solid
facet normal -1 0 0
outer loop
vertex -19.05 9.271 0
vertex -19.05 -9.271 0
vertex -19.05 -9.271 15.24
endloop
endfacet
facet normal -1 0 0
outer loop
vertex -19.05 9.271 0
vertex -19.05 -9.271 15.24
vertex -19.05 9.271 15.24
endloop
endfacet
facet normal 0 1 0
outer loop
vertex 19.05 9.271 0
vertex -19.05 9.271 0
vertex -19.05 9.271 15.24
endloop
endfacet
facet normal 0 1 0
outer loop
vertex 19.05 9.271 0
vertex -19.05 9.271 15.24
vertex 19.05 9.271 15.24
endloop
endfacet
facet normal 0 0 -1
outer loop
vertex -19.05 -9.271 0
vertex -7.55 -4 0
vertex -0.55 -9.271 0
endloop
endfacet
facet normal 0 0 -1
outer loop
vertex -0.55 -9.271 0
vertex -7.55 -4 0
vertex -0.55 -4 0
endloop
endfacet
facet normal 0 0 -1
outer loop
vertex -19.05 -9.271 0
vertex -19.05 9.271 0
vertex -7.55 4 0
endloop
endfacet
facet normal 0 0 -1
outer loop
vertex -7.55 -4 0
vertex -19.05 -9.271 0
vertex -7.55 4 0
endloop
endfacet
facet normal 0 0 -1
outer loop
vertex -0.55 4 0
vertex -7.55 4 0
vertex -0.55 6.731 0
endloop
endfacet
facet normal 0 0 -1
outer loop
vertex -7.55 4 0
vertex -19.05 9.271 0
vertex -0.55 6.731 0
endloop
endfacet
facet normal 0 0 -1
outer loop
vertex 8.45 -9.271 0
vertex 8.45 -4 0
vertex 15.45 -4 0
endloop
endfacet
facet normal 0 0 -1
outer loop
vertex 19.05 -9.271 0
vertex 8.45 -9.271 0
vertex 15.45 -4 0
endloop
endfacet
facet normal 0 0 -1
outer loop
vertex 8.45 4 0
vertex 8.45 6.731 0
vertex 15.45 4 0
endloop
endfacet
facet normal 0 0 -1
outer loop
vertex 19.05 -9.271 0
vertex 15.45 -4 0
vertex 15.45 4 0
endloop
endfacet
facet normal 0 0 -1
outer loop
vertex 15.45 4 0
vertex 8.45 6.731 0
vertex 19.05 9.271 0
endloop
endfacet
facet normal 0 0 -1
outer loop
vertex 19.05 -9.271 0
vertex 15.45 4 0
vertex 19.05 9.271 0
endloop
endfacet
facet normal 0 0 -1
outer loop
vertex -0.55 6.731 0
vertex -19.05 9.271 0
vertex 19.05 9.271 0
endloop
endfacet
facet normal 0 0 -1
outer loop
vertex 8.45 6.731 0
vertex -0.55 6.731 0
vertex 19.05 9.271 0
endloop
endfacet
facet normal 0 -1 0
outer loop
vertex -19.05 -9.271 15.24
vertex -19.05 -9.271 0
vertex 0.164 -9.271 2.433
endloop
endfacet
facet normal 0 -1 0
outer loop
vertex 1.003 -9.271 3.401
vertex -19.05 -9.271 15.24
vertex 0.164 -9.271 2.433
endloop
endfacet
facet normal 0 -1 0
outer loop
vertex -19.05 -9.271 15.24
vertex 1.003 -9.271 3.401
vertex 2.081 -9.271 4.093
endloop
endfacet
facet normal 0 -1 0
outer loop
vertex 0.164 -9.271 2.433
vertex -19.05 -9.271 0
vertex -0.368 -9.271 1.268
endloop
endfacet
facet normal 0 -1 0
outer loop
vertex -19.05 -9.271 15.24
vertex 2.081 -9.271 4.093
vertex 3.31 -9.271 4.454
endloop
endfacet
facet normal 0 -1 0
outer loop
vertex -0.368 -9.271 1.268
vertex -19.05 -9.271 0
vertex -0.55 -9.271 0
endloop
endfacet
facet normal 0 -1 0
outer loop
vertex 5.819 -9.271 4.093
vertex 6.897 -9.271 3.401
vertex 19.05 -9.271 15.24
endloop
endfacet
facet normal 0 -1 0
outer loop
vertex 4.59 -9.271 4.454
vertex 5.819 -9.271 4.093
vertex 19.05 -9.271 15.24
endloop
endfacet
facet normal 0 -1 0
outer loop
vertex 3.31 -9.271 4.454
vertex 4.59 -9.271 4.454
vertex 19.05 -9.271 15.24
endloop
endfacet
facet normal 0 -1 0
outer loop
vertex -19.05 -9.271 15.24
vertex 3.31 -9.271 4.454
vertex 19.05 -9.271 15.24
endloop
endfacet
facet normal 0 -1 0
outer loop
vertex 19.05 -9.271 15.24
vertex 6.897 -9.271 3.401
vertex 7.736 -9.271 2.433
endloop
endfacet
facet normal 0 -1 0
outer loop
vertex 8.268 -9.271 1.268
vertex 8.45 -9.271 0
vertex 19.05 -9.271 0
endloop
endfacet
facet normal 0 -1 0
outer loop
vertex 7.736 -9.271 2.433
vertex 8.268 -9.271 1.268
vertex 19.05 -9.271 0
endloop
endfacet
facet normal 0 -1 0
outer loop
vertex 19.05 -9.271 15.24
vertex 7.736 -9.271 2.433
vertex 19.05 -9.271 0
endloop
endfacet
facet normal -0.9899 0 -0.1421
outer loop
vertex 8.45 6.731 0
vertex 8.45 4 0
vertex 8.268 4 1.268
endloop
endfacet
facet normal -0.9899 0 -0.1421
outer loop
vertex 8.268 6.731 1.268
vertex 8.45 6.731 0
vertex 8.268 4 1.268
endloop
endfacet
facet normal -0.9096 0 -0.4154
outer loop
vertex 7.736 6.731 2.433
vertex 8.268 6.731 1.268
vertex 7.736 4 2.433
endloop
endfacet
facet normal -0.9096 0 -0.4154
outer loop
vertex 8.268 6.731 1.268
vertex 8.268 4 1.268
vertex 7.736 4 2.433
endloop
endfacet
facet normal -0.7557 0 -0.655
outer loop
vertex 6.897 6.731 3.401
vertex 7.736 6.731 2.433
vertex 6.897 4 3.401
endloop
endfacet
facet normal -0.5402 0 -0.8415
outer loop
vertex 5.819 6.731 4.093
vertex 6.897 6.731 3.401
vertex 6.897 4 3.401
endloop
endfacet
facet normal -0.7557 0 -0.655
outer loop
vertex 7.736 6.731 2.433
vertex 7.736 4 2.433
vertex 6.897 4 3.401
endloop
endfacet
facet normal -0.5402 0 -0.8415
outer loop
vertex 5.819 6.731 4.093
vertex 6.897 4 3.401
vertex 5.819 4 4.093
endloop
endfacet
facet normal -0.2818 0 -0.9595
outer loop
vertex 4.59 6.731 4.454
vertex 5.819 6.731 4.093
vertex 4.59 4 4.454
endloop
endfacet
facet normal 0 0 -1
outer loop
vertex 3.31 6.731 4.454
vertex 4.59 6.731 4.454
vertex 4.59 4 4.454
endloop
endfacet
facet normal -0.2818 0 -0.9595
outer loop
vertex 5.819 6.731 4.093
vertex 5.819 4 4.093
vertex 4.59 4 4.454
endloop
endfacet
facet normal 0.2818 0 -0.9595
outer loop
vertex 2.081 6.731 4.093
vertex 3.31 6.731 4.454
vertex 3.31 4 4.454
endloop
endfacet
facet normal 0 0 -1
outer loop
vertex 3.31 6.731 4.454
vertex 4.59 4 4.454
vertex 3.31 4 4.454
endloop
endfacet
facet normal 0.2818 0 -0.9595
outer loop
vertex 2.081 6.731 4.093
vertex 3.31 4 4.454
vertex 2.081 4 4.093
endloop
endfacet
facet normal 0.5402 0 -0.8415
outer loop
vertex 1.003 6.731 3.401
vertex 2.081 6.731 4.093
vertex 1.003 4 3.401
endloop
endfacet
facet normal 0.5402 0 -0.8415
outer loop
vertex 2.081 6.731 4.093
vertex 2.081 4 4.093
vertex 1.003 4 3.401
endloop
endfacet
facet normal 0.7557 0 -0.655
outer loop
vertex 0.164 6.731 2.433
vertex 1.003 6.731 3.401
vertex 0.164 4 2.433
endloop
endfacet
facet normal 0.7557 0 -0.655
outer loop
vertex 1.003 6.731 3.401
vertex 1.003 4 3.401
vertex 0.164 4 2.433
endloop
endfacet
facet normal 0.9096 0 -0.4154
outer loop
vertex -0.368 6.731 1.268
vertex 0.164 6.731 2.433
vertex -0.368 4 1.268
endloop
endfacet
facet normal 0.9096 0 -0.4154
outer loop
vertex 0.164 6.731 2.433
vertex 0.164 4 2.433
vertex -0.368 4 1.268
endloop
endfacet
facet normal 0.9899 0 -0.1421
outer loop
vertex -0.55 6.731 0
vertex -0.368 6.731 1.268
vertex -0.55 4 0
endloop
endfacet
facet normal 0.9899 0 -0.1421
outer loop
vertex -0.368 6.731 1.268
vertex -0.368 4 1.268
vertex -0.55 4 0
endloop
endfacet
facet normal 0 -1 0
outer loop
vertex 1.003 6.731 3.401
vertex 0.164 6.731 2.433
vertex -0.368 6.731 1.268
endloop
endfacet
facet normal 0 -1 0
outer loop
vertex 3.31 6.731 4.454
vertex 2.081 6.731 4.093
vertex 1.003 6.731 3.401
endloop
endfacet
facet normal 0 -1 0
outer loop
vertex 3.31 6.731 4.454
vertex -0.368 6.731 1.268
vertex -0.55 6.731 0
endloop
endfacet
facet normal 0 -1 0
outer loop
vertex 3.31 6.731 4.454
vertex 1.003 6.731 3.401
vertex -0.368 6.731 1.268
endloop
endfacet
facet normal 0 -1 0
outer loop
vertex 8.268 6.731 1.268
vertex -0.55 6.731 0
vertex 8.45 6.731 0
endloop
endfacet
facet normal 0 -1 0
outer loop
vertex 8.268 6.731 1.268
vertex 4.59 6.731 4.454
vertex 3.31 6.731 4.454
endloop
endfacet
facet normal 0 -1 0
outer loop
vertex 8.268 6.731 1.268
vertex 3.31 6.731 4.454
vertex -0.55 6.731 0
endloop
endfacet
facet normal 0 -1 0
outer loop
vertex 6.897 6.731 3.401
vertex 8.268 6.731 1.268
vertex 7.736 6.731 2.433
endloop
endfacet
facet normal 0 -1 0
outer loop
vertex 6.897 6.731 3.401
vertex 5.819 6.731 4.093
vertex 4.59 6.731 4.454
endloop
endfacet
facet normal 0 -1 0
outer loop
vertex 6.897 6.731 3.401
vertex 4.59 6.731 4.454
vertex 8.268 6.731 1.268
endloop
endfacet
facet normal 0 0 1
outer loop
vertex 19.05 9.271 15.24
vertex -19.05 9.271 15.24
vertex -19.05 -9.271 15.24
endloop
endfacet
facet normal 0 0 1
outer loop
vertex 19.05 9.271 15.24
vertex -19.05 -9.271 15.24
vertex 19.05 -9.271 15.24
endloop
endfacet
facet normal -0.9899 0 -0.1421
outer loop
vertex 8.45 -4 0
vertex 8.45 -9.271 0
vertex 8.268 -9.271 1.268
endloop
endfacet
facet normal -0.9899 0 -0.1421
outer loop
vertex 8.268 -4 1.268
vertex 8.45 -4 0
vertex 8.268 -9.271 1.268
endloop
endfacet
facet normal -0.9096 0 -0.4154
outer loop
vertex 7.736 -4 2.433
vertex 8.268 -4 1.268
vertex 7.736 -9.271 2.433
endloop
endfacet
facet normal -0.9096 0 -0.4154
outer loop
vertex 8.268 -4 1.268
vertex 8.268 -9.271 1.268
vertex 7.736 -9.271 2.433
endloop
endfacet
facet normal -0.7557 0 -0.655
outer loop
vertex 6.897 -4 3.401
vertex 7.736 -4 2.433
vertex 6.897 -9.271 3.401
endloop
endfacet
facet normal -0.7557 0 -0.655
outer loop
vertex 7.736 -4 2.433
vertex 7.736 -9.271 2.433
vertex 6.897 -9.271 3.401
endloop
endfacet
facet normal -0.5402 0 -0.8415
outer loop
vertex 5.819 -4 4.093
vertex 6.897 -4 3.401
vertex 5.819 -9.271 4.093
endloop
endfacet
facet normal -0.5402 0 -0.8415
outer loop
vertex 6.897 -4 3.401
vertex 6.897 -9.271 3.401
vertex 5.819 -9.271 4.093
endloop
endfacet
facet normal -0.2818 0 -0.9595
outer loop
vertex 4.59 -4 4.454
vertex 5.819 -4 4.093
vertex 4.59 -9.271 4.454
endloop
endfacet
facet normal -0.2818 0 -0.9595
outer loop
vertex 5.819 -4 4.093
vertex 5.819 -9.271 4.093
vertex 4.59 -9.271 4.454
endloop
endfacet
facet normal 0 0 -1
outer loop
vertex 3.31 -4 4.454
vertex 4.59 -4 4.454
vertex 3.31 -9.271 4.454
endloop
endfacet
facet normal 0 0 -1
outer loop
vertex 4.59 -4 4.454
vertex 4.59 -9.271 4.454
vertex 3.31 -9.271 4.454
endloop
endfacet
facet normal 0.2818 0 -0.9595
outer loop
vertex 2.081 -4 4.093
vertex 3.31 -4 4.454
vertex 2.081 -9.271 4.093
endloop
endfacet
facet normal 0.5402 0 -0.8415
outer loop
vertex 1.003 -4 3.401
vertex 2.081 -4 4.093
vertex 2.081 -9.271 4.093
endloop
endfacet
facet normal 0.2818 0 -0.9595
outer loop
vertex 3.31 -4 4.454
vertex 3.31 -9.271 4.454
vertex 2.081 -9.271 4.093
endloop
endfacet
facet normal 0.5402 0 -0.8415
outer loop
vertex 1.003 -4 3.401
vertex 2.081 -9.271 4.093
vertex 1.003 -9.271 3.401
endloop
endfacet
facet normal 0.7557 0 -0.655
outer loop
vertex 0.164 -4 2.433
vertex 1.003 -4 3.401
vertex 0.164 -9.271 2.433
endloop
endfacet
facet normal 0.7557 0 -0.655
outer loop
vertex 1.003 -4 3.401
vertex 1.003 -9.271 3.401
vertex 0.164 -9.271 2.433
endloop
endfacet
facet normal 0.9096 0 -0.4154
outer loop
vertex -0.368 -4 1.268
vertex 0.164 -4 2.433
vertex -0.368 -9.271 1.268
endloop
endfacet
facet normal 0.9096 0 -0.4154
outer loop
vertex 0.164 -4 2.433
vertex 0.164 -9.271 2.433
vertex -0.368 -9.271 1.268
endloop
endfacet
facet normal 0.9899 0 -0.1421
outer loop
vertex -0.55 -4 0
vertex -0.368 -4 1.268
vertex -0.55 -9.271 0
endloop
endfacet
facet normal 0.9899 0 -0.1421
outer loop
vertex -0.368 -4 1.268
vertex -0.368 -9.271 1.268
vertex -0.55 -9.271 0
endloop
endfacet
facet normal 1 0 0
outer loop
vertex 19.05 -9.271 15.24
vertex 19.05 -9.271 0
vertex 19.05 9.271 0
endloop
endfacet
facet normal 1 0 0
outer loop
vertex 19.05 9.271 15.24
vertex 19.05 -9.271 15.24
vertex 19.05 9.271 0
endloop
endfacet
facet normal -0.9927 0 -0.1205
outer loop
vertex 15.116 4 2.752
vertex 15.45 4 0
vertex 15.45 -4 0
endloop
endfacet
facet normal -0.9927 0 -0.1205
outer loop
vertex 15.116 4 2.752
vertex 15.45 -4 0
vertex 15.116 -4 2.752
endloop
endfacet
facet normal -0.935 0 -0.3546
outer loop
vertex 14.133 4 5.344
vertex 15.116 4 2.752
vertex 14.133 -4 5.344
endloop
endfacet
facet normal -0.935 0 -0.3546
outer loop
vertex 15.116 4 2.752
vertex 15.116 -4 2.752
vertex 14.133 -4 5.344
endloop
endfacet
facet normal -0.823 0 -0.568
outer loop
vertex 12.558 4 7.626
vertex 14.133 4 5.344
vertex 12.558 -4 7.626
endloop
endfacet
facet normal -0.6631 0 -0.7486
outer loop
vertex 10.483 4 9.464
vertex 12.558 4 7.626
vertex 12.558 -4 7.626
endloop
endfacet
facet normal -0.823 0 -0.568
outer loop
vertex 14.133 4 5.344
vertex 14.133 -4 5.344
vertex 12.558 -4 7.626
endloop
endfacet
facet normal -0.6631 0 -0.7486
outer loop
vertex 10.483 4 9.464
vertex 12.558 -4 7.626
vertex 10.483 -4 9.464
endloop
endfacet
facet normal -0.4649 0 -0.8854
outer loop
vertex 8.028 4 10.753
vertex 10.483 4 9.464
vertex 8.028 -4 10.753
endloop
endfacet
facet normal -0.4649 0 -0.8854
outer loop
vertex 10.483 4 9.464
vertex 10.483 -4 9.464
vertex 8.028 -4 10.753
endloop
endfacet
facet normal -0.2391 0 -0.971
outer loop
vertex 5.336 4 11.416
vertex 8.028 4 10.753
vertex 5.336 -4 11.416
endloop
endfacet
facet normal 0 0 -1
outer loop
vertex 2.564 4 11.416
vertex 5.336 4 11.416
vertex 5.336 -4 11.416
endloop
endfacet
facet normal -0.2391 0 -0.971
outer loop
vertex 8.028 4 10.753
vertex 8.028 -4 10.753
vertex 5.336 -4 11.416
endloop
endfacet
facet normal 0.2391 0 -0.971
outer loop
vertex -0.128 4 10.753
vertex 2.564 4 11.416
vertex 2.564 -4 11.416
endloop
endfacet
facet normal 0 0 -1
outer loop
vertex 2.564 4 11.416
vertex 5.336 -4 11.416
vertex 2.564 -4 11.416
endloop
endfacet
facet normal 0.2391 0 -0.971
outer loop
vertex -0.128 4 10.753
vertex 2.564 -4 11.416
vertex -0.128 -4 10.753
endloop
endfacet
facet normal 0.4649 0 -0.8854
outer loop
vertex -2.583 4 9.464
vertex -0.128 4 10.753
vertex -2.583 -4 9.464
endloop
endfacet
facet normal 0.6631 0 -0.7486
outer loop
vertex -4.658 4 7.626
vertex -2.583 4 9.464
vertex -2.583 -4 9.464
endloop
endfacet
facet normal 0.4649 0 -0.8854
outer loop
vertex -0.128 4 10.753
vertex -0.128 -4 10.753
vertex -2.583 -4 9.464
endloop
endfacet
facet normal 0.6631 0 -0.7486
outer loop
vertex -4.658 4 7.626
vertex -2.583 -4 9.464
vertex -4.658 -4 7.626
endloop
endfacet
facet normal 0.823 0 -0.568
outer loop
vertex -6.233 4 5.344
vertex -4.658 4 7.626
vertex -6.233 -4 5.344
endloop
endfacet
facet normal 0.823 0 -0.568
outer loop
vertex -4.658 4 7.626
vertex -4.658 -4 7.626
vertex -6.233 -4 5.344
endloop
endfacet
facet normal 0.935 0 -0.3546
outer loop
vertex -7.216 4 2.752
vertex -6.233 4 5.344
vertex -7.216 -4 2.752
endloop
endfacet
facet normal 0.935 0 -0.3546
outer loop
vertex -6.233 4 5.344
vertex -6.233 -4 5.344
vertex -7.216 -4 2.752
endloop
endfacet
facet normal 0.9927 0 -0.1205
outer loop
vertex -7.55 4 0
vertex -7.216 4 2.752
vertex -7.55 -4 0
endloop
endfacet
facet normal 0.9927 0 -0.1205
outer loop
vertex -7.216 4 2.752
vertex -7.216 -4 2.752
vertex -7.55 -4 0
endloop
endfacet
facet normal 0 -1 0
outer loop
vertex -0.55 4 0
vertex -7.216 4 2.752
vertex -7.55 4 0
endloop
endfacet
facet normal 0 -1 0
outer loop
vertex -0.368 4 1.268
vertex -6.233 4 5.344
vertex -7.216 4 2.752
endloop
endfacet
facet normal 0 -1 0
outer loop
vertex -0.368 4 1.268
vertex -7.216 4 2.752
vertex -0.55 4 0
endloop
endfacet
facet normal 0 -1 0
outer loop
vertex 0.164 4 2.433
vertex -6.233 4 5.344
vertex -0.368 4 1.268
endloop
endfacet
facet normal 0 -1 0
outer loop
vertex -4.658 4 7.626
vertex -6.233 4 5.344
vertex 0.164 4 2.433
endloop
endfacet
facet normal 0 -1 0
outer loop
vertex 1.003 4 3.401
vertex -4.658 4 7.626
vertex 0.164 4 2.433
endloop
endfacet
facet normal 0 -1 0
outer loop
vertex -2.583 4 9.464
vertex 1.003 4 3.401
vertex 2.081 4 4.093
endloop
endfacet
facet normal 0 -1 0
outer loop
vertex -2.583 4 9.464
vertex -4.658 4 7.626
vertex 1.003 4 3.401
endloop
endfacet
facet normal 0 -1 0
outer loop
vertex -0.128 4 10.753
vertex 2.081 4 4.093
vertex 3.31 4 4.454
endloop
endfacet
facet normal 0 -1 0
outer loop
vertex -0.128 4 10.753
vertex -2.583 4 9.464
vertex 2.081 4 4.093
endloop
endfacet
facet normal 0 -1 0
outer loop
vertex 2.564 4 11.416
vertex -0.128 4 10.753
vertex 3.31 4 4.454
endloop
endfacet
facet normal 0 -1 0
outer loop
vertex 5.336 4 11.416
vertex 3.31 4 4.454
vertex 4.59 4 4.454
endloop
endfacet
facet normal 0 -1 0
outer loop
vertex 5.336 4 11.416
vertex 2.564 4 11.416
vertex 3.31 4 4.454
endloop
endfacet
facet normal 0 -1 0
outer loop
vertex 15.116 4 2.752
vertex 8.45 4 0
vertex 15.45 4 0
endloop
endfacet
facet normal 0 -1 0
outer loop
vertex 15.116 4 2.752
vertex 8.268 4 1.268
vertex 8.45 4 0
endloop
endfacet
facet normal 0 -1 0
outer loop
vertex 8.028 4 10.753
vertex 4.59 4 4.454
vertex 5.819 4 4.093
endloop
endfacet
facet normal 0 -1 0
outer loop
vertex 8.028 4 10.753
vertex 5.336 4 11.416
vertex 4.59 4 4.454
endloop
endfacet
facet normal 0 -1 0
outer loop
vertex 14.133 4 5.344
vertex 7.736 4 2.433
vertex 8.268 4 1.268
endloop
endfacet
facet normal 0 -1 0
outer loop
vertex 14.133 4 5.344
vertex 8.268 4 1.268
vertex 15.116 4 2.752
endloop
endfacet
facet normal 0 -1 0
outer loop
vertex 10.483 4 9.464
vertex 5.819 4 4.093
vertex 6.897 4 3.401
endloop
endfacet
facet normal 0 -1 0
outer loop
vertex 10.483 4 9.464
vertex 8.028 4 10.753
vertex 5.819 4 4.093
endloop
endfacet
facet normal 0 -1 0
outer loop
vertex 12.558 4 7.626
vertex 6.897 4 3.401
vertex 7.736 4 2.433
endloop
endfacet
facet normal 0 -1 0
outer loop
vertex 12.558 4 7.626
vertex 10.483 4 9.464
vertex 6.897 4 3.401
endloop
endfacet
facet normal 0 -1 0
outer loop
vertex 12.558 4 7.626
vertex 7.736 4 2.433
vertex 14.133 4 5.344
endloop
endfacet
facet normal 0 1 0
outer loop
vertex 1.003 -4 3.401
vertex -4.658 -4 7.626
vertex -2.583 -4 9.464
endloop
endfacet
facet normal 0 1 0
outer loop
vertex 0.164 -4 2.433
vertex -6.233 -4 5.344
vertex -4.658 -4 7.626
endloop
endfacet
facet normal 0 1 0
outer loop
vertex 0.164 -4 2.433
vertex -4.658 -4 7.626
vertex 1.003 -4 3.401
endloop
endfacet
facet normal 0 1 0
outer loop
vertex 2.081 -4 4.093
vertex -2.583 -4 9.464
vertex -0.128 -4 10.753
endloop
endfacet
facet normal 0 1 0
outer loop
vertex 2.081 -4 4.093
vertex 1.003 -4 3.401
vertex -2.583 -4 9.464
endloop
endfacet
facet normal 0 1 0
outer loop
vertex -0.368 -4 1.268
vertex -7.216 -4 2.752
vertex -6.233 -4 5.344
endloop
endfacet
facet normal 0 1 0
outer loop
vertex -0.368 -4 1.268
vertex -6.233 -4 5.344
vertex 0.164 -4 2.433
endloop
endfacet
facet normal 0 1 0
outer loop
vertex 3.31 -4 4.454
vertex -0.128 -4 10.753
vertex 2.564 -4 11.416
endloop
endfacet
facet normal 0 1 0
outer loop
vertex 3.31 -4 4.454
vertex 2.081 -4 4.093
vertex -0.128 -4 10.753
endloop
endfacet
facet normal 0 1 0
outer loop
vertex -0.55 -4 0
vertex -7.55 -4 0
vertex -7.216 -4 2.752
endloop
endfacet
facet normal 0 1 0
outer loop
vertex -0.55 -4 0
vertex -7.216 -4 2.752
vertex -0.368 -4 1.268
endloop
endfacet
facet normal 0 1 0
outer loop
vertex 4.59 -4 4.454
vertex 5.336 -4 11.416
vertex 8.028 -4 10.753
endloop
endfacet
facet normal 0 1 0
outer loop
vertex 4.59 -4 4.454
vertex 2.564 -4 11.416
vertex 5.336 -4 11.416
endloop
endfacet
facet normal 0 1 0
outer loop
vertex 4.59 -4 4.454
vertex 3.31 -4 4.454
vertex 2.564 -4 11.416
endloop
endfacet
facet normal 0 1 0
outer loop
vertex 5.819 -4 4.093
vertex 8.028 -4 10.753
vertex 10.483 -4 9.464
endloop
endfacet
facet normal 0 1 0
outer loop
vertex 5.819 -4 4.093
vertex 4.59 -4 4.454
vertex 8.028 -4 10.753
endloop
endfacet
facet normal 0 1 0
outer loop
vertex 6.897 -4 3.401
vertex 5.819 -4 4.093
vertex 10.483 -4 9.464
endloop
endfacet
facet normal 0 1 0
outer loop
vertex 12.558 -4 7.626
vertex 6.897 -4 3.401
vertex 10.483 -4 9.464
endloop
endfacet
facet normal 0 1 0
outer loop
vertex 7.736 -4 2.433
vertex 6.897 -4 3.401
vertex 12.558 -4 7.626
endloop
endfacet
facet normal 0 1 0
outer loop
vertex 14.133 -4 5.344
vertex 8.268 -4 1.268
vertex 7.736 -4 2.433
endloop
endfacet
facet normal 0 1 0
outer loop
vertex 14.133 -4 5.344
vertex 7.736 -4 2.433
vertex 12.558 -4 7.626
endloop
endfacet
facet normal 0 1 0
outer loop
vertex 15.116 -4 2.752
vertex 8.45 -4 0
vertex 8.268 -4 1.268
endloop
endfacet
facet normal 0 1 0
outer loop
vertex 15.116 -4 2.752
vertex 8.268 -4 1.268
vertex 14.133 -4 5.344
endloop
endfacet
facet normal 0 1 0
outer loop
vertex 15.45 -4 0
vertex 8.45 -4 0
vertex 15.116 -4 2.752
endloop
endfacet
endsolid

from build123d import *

# Parameters (mm, degrees)
F0_W     = 38.1
F0_H     = 13.271
F1_DEPTH = 15.24
F3_DEPTH = 8
F0_H_2   = 5.271
F4_DEPTH = 15.24
F5_R     = 4.5
F6_DEPTH = 16.002


with BuildPart() as f1:
    # F0 (on Top) → F1 (new body)
    with BuildSketch(Plane.XY):
        with Locations((0, 2.6355)):
            Rectangle(F0_W, F0_H)
    extrude(amount=F1_DEPTH)

    # F2 (on face) → F3 (cut)
    with BuildSketch(Plane.XZ.offset(4)):
        with BuildLine():
            Line((8.45, 0), (15.45, 0))
            ThreePointArc((15.45, 0), (3.95, 11.5), (-7.55, 0))
            Line((-7.55, 0), (-0.55, 0))
            ThreePointArc((-0.55, 0), (3.95, 4.5), (8.45, 0))
        make_face()
        with BuildLine():
            Line((-0.55, 0), (8.45, 0))
            ThreePointArc((8.45, 0), (3.95, 4.5), (-0.55, 0))
        make_face()
    extrude(amount=-F3_DEPTH, mode=Mode.SUBTRACT)

    # F0 (on Top) → F4 (join)
    with BuildSketch(Plane.XY):
        with Locations((0, -6.6355)):
            Rectangle(F0_W, F0_H_2)
    extrude(amount=F4_DEPTH)

    # F5 (on face) → F6 (cut)
    with BuildSketch(Plane.XZ.offset(9.271)):
        with Locations((3.95, 0)):
            Circle(F5_R)
    extrude(amount=-F6_DEPTH, mode=Mode.SUBTRACT)


solid = f1.part
